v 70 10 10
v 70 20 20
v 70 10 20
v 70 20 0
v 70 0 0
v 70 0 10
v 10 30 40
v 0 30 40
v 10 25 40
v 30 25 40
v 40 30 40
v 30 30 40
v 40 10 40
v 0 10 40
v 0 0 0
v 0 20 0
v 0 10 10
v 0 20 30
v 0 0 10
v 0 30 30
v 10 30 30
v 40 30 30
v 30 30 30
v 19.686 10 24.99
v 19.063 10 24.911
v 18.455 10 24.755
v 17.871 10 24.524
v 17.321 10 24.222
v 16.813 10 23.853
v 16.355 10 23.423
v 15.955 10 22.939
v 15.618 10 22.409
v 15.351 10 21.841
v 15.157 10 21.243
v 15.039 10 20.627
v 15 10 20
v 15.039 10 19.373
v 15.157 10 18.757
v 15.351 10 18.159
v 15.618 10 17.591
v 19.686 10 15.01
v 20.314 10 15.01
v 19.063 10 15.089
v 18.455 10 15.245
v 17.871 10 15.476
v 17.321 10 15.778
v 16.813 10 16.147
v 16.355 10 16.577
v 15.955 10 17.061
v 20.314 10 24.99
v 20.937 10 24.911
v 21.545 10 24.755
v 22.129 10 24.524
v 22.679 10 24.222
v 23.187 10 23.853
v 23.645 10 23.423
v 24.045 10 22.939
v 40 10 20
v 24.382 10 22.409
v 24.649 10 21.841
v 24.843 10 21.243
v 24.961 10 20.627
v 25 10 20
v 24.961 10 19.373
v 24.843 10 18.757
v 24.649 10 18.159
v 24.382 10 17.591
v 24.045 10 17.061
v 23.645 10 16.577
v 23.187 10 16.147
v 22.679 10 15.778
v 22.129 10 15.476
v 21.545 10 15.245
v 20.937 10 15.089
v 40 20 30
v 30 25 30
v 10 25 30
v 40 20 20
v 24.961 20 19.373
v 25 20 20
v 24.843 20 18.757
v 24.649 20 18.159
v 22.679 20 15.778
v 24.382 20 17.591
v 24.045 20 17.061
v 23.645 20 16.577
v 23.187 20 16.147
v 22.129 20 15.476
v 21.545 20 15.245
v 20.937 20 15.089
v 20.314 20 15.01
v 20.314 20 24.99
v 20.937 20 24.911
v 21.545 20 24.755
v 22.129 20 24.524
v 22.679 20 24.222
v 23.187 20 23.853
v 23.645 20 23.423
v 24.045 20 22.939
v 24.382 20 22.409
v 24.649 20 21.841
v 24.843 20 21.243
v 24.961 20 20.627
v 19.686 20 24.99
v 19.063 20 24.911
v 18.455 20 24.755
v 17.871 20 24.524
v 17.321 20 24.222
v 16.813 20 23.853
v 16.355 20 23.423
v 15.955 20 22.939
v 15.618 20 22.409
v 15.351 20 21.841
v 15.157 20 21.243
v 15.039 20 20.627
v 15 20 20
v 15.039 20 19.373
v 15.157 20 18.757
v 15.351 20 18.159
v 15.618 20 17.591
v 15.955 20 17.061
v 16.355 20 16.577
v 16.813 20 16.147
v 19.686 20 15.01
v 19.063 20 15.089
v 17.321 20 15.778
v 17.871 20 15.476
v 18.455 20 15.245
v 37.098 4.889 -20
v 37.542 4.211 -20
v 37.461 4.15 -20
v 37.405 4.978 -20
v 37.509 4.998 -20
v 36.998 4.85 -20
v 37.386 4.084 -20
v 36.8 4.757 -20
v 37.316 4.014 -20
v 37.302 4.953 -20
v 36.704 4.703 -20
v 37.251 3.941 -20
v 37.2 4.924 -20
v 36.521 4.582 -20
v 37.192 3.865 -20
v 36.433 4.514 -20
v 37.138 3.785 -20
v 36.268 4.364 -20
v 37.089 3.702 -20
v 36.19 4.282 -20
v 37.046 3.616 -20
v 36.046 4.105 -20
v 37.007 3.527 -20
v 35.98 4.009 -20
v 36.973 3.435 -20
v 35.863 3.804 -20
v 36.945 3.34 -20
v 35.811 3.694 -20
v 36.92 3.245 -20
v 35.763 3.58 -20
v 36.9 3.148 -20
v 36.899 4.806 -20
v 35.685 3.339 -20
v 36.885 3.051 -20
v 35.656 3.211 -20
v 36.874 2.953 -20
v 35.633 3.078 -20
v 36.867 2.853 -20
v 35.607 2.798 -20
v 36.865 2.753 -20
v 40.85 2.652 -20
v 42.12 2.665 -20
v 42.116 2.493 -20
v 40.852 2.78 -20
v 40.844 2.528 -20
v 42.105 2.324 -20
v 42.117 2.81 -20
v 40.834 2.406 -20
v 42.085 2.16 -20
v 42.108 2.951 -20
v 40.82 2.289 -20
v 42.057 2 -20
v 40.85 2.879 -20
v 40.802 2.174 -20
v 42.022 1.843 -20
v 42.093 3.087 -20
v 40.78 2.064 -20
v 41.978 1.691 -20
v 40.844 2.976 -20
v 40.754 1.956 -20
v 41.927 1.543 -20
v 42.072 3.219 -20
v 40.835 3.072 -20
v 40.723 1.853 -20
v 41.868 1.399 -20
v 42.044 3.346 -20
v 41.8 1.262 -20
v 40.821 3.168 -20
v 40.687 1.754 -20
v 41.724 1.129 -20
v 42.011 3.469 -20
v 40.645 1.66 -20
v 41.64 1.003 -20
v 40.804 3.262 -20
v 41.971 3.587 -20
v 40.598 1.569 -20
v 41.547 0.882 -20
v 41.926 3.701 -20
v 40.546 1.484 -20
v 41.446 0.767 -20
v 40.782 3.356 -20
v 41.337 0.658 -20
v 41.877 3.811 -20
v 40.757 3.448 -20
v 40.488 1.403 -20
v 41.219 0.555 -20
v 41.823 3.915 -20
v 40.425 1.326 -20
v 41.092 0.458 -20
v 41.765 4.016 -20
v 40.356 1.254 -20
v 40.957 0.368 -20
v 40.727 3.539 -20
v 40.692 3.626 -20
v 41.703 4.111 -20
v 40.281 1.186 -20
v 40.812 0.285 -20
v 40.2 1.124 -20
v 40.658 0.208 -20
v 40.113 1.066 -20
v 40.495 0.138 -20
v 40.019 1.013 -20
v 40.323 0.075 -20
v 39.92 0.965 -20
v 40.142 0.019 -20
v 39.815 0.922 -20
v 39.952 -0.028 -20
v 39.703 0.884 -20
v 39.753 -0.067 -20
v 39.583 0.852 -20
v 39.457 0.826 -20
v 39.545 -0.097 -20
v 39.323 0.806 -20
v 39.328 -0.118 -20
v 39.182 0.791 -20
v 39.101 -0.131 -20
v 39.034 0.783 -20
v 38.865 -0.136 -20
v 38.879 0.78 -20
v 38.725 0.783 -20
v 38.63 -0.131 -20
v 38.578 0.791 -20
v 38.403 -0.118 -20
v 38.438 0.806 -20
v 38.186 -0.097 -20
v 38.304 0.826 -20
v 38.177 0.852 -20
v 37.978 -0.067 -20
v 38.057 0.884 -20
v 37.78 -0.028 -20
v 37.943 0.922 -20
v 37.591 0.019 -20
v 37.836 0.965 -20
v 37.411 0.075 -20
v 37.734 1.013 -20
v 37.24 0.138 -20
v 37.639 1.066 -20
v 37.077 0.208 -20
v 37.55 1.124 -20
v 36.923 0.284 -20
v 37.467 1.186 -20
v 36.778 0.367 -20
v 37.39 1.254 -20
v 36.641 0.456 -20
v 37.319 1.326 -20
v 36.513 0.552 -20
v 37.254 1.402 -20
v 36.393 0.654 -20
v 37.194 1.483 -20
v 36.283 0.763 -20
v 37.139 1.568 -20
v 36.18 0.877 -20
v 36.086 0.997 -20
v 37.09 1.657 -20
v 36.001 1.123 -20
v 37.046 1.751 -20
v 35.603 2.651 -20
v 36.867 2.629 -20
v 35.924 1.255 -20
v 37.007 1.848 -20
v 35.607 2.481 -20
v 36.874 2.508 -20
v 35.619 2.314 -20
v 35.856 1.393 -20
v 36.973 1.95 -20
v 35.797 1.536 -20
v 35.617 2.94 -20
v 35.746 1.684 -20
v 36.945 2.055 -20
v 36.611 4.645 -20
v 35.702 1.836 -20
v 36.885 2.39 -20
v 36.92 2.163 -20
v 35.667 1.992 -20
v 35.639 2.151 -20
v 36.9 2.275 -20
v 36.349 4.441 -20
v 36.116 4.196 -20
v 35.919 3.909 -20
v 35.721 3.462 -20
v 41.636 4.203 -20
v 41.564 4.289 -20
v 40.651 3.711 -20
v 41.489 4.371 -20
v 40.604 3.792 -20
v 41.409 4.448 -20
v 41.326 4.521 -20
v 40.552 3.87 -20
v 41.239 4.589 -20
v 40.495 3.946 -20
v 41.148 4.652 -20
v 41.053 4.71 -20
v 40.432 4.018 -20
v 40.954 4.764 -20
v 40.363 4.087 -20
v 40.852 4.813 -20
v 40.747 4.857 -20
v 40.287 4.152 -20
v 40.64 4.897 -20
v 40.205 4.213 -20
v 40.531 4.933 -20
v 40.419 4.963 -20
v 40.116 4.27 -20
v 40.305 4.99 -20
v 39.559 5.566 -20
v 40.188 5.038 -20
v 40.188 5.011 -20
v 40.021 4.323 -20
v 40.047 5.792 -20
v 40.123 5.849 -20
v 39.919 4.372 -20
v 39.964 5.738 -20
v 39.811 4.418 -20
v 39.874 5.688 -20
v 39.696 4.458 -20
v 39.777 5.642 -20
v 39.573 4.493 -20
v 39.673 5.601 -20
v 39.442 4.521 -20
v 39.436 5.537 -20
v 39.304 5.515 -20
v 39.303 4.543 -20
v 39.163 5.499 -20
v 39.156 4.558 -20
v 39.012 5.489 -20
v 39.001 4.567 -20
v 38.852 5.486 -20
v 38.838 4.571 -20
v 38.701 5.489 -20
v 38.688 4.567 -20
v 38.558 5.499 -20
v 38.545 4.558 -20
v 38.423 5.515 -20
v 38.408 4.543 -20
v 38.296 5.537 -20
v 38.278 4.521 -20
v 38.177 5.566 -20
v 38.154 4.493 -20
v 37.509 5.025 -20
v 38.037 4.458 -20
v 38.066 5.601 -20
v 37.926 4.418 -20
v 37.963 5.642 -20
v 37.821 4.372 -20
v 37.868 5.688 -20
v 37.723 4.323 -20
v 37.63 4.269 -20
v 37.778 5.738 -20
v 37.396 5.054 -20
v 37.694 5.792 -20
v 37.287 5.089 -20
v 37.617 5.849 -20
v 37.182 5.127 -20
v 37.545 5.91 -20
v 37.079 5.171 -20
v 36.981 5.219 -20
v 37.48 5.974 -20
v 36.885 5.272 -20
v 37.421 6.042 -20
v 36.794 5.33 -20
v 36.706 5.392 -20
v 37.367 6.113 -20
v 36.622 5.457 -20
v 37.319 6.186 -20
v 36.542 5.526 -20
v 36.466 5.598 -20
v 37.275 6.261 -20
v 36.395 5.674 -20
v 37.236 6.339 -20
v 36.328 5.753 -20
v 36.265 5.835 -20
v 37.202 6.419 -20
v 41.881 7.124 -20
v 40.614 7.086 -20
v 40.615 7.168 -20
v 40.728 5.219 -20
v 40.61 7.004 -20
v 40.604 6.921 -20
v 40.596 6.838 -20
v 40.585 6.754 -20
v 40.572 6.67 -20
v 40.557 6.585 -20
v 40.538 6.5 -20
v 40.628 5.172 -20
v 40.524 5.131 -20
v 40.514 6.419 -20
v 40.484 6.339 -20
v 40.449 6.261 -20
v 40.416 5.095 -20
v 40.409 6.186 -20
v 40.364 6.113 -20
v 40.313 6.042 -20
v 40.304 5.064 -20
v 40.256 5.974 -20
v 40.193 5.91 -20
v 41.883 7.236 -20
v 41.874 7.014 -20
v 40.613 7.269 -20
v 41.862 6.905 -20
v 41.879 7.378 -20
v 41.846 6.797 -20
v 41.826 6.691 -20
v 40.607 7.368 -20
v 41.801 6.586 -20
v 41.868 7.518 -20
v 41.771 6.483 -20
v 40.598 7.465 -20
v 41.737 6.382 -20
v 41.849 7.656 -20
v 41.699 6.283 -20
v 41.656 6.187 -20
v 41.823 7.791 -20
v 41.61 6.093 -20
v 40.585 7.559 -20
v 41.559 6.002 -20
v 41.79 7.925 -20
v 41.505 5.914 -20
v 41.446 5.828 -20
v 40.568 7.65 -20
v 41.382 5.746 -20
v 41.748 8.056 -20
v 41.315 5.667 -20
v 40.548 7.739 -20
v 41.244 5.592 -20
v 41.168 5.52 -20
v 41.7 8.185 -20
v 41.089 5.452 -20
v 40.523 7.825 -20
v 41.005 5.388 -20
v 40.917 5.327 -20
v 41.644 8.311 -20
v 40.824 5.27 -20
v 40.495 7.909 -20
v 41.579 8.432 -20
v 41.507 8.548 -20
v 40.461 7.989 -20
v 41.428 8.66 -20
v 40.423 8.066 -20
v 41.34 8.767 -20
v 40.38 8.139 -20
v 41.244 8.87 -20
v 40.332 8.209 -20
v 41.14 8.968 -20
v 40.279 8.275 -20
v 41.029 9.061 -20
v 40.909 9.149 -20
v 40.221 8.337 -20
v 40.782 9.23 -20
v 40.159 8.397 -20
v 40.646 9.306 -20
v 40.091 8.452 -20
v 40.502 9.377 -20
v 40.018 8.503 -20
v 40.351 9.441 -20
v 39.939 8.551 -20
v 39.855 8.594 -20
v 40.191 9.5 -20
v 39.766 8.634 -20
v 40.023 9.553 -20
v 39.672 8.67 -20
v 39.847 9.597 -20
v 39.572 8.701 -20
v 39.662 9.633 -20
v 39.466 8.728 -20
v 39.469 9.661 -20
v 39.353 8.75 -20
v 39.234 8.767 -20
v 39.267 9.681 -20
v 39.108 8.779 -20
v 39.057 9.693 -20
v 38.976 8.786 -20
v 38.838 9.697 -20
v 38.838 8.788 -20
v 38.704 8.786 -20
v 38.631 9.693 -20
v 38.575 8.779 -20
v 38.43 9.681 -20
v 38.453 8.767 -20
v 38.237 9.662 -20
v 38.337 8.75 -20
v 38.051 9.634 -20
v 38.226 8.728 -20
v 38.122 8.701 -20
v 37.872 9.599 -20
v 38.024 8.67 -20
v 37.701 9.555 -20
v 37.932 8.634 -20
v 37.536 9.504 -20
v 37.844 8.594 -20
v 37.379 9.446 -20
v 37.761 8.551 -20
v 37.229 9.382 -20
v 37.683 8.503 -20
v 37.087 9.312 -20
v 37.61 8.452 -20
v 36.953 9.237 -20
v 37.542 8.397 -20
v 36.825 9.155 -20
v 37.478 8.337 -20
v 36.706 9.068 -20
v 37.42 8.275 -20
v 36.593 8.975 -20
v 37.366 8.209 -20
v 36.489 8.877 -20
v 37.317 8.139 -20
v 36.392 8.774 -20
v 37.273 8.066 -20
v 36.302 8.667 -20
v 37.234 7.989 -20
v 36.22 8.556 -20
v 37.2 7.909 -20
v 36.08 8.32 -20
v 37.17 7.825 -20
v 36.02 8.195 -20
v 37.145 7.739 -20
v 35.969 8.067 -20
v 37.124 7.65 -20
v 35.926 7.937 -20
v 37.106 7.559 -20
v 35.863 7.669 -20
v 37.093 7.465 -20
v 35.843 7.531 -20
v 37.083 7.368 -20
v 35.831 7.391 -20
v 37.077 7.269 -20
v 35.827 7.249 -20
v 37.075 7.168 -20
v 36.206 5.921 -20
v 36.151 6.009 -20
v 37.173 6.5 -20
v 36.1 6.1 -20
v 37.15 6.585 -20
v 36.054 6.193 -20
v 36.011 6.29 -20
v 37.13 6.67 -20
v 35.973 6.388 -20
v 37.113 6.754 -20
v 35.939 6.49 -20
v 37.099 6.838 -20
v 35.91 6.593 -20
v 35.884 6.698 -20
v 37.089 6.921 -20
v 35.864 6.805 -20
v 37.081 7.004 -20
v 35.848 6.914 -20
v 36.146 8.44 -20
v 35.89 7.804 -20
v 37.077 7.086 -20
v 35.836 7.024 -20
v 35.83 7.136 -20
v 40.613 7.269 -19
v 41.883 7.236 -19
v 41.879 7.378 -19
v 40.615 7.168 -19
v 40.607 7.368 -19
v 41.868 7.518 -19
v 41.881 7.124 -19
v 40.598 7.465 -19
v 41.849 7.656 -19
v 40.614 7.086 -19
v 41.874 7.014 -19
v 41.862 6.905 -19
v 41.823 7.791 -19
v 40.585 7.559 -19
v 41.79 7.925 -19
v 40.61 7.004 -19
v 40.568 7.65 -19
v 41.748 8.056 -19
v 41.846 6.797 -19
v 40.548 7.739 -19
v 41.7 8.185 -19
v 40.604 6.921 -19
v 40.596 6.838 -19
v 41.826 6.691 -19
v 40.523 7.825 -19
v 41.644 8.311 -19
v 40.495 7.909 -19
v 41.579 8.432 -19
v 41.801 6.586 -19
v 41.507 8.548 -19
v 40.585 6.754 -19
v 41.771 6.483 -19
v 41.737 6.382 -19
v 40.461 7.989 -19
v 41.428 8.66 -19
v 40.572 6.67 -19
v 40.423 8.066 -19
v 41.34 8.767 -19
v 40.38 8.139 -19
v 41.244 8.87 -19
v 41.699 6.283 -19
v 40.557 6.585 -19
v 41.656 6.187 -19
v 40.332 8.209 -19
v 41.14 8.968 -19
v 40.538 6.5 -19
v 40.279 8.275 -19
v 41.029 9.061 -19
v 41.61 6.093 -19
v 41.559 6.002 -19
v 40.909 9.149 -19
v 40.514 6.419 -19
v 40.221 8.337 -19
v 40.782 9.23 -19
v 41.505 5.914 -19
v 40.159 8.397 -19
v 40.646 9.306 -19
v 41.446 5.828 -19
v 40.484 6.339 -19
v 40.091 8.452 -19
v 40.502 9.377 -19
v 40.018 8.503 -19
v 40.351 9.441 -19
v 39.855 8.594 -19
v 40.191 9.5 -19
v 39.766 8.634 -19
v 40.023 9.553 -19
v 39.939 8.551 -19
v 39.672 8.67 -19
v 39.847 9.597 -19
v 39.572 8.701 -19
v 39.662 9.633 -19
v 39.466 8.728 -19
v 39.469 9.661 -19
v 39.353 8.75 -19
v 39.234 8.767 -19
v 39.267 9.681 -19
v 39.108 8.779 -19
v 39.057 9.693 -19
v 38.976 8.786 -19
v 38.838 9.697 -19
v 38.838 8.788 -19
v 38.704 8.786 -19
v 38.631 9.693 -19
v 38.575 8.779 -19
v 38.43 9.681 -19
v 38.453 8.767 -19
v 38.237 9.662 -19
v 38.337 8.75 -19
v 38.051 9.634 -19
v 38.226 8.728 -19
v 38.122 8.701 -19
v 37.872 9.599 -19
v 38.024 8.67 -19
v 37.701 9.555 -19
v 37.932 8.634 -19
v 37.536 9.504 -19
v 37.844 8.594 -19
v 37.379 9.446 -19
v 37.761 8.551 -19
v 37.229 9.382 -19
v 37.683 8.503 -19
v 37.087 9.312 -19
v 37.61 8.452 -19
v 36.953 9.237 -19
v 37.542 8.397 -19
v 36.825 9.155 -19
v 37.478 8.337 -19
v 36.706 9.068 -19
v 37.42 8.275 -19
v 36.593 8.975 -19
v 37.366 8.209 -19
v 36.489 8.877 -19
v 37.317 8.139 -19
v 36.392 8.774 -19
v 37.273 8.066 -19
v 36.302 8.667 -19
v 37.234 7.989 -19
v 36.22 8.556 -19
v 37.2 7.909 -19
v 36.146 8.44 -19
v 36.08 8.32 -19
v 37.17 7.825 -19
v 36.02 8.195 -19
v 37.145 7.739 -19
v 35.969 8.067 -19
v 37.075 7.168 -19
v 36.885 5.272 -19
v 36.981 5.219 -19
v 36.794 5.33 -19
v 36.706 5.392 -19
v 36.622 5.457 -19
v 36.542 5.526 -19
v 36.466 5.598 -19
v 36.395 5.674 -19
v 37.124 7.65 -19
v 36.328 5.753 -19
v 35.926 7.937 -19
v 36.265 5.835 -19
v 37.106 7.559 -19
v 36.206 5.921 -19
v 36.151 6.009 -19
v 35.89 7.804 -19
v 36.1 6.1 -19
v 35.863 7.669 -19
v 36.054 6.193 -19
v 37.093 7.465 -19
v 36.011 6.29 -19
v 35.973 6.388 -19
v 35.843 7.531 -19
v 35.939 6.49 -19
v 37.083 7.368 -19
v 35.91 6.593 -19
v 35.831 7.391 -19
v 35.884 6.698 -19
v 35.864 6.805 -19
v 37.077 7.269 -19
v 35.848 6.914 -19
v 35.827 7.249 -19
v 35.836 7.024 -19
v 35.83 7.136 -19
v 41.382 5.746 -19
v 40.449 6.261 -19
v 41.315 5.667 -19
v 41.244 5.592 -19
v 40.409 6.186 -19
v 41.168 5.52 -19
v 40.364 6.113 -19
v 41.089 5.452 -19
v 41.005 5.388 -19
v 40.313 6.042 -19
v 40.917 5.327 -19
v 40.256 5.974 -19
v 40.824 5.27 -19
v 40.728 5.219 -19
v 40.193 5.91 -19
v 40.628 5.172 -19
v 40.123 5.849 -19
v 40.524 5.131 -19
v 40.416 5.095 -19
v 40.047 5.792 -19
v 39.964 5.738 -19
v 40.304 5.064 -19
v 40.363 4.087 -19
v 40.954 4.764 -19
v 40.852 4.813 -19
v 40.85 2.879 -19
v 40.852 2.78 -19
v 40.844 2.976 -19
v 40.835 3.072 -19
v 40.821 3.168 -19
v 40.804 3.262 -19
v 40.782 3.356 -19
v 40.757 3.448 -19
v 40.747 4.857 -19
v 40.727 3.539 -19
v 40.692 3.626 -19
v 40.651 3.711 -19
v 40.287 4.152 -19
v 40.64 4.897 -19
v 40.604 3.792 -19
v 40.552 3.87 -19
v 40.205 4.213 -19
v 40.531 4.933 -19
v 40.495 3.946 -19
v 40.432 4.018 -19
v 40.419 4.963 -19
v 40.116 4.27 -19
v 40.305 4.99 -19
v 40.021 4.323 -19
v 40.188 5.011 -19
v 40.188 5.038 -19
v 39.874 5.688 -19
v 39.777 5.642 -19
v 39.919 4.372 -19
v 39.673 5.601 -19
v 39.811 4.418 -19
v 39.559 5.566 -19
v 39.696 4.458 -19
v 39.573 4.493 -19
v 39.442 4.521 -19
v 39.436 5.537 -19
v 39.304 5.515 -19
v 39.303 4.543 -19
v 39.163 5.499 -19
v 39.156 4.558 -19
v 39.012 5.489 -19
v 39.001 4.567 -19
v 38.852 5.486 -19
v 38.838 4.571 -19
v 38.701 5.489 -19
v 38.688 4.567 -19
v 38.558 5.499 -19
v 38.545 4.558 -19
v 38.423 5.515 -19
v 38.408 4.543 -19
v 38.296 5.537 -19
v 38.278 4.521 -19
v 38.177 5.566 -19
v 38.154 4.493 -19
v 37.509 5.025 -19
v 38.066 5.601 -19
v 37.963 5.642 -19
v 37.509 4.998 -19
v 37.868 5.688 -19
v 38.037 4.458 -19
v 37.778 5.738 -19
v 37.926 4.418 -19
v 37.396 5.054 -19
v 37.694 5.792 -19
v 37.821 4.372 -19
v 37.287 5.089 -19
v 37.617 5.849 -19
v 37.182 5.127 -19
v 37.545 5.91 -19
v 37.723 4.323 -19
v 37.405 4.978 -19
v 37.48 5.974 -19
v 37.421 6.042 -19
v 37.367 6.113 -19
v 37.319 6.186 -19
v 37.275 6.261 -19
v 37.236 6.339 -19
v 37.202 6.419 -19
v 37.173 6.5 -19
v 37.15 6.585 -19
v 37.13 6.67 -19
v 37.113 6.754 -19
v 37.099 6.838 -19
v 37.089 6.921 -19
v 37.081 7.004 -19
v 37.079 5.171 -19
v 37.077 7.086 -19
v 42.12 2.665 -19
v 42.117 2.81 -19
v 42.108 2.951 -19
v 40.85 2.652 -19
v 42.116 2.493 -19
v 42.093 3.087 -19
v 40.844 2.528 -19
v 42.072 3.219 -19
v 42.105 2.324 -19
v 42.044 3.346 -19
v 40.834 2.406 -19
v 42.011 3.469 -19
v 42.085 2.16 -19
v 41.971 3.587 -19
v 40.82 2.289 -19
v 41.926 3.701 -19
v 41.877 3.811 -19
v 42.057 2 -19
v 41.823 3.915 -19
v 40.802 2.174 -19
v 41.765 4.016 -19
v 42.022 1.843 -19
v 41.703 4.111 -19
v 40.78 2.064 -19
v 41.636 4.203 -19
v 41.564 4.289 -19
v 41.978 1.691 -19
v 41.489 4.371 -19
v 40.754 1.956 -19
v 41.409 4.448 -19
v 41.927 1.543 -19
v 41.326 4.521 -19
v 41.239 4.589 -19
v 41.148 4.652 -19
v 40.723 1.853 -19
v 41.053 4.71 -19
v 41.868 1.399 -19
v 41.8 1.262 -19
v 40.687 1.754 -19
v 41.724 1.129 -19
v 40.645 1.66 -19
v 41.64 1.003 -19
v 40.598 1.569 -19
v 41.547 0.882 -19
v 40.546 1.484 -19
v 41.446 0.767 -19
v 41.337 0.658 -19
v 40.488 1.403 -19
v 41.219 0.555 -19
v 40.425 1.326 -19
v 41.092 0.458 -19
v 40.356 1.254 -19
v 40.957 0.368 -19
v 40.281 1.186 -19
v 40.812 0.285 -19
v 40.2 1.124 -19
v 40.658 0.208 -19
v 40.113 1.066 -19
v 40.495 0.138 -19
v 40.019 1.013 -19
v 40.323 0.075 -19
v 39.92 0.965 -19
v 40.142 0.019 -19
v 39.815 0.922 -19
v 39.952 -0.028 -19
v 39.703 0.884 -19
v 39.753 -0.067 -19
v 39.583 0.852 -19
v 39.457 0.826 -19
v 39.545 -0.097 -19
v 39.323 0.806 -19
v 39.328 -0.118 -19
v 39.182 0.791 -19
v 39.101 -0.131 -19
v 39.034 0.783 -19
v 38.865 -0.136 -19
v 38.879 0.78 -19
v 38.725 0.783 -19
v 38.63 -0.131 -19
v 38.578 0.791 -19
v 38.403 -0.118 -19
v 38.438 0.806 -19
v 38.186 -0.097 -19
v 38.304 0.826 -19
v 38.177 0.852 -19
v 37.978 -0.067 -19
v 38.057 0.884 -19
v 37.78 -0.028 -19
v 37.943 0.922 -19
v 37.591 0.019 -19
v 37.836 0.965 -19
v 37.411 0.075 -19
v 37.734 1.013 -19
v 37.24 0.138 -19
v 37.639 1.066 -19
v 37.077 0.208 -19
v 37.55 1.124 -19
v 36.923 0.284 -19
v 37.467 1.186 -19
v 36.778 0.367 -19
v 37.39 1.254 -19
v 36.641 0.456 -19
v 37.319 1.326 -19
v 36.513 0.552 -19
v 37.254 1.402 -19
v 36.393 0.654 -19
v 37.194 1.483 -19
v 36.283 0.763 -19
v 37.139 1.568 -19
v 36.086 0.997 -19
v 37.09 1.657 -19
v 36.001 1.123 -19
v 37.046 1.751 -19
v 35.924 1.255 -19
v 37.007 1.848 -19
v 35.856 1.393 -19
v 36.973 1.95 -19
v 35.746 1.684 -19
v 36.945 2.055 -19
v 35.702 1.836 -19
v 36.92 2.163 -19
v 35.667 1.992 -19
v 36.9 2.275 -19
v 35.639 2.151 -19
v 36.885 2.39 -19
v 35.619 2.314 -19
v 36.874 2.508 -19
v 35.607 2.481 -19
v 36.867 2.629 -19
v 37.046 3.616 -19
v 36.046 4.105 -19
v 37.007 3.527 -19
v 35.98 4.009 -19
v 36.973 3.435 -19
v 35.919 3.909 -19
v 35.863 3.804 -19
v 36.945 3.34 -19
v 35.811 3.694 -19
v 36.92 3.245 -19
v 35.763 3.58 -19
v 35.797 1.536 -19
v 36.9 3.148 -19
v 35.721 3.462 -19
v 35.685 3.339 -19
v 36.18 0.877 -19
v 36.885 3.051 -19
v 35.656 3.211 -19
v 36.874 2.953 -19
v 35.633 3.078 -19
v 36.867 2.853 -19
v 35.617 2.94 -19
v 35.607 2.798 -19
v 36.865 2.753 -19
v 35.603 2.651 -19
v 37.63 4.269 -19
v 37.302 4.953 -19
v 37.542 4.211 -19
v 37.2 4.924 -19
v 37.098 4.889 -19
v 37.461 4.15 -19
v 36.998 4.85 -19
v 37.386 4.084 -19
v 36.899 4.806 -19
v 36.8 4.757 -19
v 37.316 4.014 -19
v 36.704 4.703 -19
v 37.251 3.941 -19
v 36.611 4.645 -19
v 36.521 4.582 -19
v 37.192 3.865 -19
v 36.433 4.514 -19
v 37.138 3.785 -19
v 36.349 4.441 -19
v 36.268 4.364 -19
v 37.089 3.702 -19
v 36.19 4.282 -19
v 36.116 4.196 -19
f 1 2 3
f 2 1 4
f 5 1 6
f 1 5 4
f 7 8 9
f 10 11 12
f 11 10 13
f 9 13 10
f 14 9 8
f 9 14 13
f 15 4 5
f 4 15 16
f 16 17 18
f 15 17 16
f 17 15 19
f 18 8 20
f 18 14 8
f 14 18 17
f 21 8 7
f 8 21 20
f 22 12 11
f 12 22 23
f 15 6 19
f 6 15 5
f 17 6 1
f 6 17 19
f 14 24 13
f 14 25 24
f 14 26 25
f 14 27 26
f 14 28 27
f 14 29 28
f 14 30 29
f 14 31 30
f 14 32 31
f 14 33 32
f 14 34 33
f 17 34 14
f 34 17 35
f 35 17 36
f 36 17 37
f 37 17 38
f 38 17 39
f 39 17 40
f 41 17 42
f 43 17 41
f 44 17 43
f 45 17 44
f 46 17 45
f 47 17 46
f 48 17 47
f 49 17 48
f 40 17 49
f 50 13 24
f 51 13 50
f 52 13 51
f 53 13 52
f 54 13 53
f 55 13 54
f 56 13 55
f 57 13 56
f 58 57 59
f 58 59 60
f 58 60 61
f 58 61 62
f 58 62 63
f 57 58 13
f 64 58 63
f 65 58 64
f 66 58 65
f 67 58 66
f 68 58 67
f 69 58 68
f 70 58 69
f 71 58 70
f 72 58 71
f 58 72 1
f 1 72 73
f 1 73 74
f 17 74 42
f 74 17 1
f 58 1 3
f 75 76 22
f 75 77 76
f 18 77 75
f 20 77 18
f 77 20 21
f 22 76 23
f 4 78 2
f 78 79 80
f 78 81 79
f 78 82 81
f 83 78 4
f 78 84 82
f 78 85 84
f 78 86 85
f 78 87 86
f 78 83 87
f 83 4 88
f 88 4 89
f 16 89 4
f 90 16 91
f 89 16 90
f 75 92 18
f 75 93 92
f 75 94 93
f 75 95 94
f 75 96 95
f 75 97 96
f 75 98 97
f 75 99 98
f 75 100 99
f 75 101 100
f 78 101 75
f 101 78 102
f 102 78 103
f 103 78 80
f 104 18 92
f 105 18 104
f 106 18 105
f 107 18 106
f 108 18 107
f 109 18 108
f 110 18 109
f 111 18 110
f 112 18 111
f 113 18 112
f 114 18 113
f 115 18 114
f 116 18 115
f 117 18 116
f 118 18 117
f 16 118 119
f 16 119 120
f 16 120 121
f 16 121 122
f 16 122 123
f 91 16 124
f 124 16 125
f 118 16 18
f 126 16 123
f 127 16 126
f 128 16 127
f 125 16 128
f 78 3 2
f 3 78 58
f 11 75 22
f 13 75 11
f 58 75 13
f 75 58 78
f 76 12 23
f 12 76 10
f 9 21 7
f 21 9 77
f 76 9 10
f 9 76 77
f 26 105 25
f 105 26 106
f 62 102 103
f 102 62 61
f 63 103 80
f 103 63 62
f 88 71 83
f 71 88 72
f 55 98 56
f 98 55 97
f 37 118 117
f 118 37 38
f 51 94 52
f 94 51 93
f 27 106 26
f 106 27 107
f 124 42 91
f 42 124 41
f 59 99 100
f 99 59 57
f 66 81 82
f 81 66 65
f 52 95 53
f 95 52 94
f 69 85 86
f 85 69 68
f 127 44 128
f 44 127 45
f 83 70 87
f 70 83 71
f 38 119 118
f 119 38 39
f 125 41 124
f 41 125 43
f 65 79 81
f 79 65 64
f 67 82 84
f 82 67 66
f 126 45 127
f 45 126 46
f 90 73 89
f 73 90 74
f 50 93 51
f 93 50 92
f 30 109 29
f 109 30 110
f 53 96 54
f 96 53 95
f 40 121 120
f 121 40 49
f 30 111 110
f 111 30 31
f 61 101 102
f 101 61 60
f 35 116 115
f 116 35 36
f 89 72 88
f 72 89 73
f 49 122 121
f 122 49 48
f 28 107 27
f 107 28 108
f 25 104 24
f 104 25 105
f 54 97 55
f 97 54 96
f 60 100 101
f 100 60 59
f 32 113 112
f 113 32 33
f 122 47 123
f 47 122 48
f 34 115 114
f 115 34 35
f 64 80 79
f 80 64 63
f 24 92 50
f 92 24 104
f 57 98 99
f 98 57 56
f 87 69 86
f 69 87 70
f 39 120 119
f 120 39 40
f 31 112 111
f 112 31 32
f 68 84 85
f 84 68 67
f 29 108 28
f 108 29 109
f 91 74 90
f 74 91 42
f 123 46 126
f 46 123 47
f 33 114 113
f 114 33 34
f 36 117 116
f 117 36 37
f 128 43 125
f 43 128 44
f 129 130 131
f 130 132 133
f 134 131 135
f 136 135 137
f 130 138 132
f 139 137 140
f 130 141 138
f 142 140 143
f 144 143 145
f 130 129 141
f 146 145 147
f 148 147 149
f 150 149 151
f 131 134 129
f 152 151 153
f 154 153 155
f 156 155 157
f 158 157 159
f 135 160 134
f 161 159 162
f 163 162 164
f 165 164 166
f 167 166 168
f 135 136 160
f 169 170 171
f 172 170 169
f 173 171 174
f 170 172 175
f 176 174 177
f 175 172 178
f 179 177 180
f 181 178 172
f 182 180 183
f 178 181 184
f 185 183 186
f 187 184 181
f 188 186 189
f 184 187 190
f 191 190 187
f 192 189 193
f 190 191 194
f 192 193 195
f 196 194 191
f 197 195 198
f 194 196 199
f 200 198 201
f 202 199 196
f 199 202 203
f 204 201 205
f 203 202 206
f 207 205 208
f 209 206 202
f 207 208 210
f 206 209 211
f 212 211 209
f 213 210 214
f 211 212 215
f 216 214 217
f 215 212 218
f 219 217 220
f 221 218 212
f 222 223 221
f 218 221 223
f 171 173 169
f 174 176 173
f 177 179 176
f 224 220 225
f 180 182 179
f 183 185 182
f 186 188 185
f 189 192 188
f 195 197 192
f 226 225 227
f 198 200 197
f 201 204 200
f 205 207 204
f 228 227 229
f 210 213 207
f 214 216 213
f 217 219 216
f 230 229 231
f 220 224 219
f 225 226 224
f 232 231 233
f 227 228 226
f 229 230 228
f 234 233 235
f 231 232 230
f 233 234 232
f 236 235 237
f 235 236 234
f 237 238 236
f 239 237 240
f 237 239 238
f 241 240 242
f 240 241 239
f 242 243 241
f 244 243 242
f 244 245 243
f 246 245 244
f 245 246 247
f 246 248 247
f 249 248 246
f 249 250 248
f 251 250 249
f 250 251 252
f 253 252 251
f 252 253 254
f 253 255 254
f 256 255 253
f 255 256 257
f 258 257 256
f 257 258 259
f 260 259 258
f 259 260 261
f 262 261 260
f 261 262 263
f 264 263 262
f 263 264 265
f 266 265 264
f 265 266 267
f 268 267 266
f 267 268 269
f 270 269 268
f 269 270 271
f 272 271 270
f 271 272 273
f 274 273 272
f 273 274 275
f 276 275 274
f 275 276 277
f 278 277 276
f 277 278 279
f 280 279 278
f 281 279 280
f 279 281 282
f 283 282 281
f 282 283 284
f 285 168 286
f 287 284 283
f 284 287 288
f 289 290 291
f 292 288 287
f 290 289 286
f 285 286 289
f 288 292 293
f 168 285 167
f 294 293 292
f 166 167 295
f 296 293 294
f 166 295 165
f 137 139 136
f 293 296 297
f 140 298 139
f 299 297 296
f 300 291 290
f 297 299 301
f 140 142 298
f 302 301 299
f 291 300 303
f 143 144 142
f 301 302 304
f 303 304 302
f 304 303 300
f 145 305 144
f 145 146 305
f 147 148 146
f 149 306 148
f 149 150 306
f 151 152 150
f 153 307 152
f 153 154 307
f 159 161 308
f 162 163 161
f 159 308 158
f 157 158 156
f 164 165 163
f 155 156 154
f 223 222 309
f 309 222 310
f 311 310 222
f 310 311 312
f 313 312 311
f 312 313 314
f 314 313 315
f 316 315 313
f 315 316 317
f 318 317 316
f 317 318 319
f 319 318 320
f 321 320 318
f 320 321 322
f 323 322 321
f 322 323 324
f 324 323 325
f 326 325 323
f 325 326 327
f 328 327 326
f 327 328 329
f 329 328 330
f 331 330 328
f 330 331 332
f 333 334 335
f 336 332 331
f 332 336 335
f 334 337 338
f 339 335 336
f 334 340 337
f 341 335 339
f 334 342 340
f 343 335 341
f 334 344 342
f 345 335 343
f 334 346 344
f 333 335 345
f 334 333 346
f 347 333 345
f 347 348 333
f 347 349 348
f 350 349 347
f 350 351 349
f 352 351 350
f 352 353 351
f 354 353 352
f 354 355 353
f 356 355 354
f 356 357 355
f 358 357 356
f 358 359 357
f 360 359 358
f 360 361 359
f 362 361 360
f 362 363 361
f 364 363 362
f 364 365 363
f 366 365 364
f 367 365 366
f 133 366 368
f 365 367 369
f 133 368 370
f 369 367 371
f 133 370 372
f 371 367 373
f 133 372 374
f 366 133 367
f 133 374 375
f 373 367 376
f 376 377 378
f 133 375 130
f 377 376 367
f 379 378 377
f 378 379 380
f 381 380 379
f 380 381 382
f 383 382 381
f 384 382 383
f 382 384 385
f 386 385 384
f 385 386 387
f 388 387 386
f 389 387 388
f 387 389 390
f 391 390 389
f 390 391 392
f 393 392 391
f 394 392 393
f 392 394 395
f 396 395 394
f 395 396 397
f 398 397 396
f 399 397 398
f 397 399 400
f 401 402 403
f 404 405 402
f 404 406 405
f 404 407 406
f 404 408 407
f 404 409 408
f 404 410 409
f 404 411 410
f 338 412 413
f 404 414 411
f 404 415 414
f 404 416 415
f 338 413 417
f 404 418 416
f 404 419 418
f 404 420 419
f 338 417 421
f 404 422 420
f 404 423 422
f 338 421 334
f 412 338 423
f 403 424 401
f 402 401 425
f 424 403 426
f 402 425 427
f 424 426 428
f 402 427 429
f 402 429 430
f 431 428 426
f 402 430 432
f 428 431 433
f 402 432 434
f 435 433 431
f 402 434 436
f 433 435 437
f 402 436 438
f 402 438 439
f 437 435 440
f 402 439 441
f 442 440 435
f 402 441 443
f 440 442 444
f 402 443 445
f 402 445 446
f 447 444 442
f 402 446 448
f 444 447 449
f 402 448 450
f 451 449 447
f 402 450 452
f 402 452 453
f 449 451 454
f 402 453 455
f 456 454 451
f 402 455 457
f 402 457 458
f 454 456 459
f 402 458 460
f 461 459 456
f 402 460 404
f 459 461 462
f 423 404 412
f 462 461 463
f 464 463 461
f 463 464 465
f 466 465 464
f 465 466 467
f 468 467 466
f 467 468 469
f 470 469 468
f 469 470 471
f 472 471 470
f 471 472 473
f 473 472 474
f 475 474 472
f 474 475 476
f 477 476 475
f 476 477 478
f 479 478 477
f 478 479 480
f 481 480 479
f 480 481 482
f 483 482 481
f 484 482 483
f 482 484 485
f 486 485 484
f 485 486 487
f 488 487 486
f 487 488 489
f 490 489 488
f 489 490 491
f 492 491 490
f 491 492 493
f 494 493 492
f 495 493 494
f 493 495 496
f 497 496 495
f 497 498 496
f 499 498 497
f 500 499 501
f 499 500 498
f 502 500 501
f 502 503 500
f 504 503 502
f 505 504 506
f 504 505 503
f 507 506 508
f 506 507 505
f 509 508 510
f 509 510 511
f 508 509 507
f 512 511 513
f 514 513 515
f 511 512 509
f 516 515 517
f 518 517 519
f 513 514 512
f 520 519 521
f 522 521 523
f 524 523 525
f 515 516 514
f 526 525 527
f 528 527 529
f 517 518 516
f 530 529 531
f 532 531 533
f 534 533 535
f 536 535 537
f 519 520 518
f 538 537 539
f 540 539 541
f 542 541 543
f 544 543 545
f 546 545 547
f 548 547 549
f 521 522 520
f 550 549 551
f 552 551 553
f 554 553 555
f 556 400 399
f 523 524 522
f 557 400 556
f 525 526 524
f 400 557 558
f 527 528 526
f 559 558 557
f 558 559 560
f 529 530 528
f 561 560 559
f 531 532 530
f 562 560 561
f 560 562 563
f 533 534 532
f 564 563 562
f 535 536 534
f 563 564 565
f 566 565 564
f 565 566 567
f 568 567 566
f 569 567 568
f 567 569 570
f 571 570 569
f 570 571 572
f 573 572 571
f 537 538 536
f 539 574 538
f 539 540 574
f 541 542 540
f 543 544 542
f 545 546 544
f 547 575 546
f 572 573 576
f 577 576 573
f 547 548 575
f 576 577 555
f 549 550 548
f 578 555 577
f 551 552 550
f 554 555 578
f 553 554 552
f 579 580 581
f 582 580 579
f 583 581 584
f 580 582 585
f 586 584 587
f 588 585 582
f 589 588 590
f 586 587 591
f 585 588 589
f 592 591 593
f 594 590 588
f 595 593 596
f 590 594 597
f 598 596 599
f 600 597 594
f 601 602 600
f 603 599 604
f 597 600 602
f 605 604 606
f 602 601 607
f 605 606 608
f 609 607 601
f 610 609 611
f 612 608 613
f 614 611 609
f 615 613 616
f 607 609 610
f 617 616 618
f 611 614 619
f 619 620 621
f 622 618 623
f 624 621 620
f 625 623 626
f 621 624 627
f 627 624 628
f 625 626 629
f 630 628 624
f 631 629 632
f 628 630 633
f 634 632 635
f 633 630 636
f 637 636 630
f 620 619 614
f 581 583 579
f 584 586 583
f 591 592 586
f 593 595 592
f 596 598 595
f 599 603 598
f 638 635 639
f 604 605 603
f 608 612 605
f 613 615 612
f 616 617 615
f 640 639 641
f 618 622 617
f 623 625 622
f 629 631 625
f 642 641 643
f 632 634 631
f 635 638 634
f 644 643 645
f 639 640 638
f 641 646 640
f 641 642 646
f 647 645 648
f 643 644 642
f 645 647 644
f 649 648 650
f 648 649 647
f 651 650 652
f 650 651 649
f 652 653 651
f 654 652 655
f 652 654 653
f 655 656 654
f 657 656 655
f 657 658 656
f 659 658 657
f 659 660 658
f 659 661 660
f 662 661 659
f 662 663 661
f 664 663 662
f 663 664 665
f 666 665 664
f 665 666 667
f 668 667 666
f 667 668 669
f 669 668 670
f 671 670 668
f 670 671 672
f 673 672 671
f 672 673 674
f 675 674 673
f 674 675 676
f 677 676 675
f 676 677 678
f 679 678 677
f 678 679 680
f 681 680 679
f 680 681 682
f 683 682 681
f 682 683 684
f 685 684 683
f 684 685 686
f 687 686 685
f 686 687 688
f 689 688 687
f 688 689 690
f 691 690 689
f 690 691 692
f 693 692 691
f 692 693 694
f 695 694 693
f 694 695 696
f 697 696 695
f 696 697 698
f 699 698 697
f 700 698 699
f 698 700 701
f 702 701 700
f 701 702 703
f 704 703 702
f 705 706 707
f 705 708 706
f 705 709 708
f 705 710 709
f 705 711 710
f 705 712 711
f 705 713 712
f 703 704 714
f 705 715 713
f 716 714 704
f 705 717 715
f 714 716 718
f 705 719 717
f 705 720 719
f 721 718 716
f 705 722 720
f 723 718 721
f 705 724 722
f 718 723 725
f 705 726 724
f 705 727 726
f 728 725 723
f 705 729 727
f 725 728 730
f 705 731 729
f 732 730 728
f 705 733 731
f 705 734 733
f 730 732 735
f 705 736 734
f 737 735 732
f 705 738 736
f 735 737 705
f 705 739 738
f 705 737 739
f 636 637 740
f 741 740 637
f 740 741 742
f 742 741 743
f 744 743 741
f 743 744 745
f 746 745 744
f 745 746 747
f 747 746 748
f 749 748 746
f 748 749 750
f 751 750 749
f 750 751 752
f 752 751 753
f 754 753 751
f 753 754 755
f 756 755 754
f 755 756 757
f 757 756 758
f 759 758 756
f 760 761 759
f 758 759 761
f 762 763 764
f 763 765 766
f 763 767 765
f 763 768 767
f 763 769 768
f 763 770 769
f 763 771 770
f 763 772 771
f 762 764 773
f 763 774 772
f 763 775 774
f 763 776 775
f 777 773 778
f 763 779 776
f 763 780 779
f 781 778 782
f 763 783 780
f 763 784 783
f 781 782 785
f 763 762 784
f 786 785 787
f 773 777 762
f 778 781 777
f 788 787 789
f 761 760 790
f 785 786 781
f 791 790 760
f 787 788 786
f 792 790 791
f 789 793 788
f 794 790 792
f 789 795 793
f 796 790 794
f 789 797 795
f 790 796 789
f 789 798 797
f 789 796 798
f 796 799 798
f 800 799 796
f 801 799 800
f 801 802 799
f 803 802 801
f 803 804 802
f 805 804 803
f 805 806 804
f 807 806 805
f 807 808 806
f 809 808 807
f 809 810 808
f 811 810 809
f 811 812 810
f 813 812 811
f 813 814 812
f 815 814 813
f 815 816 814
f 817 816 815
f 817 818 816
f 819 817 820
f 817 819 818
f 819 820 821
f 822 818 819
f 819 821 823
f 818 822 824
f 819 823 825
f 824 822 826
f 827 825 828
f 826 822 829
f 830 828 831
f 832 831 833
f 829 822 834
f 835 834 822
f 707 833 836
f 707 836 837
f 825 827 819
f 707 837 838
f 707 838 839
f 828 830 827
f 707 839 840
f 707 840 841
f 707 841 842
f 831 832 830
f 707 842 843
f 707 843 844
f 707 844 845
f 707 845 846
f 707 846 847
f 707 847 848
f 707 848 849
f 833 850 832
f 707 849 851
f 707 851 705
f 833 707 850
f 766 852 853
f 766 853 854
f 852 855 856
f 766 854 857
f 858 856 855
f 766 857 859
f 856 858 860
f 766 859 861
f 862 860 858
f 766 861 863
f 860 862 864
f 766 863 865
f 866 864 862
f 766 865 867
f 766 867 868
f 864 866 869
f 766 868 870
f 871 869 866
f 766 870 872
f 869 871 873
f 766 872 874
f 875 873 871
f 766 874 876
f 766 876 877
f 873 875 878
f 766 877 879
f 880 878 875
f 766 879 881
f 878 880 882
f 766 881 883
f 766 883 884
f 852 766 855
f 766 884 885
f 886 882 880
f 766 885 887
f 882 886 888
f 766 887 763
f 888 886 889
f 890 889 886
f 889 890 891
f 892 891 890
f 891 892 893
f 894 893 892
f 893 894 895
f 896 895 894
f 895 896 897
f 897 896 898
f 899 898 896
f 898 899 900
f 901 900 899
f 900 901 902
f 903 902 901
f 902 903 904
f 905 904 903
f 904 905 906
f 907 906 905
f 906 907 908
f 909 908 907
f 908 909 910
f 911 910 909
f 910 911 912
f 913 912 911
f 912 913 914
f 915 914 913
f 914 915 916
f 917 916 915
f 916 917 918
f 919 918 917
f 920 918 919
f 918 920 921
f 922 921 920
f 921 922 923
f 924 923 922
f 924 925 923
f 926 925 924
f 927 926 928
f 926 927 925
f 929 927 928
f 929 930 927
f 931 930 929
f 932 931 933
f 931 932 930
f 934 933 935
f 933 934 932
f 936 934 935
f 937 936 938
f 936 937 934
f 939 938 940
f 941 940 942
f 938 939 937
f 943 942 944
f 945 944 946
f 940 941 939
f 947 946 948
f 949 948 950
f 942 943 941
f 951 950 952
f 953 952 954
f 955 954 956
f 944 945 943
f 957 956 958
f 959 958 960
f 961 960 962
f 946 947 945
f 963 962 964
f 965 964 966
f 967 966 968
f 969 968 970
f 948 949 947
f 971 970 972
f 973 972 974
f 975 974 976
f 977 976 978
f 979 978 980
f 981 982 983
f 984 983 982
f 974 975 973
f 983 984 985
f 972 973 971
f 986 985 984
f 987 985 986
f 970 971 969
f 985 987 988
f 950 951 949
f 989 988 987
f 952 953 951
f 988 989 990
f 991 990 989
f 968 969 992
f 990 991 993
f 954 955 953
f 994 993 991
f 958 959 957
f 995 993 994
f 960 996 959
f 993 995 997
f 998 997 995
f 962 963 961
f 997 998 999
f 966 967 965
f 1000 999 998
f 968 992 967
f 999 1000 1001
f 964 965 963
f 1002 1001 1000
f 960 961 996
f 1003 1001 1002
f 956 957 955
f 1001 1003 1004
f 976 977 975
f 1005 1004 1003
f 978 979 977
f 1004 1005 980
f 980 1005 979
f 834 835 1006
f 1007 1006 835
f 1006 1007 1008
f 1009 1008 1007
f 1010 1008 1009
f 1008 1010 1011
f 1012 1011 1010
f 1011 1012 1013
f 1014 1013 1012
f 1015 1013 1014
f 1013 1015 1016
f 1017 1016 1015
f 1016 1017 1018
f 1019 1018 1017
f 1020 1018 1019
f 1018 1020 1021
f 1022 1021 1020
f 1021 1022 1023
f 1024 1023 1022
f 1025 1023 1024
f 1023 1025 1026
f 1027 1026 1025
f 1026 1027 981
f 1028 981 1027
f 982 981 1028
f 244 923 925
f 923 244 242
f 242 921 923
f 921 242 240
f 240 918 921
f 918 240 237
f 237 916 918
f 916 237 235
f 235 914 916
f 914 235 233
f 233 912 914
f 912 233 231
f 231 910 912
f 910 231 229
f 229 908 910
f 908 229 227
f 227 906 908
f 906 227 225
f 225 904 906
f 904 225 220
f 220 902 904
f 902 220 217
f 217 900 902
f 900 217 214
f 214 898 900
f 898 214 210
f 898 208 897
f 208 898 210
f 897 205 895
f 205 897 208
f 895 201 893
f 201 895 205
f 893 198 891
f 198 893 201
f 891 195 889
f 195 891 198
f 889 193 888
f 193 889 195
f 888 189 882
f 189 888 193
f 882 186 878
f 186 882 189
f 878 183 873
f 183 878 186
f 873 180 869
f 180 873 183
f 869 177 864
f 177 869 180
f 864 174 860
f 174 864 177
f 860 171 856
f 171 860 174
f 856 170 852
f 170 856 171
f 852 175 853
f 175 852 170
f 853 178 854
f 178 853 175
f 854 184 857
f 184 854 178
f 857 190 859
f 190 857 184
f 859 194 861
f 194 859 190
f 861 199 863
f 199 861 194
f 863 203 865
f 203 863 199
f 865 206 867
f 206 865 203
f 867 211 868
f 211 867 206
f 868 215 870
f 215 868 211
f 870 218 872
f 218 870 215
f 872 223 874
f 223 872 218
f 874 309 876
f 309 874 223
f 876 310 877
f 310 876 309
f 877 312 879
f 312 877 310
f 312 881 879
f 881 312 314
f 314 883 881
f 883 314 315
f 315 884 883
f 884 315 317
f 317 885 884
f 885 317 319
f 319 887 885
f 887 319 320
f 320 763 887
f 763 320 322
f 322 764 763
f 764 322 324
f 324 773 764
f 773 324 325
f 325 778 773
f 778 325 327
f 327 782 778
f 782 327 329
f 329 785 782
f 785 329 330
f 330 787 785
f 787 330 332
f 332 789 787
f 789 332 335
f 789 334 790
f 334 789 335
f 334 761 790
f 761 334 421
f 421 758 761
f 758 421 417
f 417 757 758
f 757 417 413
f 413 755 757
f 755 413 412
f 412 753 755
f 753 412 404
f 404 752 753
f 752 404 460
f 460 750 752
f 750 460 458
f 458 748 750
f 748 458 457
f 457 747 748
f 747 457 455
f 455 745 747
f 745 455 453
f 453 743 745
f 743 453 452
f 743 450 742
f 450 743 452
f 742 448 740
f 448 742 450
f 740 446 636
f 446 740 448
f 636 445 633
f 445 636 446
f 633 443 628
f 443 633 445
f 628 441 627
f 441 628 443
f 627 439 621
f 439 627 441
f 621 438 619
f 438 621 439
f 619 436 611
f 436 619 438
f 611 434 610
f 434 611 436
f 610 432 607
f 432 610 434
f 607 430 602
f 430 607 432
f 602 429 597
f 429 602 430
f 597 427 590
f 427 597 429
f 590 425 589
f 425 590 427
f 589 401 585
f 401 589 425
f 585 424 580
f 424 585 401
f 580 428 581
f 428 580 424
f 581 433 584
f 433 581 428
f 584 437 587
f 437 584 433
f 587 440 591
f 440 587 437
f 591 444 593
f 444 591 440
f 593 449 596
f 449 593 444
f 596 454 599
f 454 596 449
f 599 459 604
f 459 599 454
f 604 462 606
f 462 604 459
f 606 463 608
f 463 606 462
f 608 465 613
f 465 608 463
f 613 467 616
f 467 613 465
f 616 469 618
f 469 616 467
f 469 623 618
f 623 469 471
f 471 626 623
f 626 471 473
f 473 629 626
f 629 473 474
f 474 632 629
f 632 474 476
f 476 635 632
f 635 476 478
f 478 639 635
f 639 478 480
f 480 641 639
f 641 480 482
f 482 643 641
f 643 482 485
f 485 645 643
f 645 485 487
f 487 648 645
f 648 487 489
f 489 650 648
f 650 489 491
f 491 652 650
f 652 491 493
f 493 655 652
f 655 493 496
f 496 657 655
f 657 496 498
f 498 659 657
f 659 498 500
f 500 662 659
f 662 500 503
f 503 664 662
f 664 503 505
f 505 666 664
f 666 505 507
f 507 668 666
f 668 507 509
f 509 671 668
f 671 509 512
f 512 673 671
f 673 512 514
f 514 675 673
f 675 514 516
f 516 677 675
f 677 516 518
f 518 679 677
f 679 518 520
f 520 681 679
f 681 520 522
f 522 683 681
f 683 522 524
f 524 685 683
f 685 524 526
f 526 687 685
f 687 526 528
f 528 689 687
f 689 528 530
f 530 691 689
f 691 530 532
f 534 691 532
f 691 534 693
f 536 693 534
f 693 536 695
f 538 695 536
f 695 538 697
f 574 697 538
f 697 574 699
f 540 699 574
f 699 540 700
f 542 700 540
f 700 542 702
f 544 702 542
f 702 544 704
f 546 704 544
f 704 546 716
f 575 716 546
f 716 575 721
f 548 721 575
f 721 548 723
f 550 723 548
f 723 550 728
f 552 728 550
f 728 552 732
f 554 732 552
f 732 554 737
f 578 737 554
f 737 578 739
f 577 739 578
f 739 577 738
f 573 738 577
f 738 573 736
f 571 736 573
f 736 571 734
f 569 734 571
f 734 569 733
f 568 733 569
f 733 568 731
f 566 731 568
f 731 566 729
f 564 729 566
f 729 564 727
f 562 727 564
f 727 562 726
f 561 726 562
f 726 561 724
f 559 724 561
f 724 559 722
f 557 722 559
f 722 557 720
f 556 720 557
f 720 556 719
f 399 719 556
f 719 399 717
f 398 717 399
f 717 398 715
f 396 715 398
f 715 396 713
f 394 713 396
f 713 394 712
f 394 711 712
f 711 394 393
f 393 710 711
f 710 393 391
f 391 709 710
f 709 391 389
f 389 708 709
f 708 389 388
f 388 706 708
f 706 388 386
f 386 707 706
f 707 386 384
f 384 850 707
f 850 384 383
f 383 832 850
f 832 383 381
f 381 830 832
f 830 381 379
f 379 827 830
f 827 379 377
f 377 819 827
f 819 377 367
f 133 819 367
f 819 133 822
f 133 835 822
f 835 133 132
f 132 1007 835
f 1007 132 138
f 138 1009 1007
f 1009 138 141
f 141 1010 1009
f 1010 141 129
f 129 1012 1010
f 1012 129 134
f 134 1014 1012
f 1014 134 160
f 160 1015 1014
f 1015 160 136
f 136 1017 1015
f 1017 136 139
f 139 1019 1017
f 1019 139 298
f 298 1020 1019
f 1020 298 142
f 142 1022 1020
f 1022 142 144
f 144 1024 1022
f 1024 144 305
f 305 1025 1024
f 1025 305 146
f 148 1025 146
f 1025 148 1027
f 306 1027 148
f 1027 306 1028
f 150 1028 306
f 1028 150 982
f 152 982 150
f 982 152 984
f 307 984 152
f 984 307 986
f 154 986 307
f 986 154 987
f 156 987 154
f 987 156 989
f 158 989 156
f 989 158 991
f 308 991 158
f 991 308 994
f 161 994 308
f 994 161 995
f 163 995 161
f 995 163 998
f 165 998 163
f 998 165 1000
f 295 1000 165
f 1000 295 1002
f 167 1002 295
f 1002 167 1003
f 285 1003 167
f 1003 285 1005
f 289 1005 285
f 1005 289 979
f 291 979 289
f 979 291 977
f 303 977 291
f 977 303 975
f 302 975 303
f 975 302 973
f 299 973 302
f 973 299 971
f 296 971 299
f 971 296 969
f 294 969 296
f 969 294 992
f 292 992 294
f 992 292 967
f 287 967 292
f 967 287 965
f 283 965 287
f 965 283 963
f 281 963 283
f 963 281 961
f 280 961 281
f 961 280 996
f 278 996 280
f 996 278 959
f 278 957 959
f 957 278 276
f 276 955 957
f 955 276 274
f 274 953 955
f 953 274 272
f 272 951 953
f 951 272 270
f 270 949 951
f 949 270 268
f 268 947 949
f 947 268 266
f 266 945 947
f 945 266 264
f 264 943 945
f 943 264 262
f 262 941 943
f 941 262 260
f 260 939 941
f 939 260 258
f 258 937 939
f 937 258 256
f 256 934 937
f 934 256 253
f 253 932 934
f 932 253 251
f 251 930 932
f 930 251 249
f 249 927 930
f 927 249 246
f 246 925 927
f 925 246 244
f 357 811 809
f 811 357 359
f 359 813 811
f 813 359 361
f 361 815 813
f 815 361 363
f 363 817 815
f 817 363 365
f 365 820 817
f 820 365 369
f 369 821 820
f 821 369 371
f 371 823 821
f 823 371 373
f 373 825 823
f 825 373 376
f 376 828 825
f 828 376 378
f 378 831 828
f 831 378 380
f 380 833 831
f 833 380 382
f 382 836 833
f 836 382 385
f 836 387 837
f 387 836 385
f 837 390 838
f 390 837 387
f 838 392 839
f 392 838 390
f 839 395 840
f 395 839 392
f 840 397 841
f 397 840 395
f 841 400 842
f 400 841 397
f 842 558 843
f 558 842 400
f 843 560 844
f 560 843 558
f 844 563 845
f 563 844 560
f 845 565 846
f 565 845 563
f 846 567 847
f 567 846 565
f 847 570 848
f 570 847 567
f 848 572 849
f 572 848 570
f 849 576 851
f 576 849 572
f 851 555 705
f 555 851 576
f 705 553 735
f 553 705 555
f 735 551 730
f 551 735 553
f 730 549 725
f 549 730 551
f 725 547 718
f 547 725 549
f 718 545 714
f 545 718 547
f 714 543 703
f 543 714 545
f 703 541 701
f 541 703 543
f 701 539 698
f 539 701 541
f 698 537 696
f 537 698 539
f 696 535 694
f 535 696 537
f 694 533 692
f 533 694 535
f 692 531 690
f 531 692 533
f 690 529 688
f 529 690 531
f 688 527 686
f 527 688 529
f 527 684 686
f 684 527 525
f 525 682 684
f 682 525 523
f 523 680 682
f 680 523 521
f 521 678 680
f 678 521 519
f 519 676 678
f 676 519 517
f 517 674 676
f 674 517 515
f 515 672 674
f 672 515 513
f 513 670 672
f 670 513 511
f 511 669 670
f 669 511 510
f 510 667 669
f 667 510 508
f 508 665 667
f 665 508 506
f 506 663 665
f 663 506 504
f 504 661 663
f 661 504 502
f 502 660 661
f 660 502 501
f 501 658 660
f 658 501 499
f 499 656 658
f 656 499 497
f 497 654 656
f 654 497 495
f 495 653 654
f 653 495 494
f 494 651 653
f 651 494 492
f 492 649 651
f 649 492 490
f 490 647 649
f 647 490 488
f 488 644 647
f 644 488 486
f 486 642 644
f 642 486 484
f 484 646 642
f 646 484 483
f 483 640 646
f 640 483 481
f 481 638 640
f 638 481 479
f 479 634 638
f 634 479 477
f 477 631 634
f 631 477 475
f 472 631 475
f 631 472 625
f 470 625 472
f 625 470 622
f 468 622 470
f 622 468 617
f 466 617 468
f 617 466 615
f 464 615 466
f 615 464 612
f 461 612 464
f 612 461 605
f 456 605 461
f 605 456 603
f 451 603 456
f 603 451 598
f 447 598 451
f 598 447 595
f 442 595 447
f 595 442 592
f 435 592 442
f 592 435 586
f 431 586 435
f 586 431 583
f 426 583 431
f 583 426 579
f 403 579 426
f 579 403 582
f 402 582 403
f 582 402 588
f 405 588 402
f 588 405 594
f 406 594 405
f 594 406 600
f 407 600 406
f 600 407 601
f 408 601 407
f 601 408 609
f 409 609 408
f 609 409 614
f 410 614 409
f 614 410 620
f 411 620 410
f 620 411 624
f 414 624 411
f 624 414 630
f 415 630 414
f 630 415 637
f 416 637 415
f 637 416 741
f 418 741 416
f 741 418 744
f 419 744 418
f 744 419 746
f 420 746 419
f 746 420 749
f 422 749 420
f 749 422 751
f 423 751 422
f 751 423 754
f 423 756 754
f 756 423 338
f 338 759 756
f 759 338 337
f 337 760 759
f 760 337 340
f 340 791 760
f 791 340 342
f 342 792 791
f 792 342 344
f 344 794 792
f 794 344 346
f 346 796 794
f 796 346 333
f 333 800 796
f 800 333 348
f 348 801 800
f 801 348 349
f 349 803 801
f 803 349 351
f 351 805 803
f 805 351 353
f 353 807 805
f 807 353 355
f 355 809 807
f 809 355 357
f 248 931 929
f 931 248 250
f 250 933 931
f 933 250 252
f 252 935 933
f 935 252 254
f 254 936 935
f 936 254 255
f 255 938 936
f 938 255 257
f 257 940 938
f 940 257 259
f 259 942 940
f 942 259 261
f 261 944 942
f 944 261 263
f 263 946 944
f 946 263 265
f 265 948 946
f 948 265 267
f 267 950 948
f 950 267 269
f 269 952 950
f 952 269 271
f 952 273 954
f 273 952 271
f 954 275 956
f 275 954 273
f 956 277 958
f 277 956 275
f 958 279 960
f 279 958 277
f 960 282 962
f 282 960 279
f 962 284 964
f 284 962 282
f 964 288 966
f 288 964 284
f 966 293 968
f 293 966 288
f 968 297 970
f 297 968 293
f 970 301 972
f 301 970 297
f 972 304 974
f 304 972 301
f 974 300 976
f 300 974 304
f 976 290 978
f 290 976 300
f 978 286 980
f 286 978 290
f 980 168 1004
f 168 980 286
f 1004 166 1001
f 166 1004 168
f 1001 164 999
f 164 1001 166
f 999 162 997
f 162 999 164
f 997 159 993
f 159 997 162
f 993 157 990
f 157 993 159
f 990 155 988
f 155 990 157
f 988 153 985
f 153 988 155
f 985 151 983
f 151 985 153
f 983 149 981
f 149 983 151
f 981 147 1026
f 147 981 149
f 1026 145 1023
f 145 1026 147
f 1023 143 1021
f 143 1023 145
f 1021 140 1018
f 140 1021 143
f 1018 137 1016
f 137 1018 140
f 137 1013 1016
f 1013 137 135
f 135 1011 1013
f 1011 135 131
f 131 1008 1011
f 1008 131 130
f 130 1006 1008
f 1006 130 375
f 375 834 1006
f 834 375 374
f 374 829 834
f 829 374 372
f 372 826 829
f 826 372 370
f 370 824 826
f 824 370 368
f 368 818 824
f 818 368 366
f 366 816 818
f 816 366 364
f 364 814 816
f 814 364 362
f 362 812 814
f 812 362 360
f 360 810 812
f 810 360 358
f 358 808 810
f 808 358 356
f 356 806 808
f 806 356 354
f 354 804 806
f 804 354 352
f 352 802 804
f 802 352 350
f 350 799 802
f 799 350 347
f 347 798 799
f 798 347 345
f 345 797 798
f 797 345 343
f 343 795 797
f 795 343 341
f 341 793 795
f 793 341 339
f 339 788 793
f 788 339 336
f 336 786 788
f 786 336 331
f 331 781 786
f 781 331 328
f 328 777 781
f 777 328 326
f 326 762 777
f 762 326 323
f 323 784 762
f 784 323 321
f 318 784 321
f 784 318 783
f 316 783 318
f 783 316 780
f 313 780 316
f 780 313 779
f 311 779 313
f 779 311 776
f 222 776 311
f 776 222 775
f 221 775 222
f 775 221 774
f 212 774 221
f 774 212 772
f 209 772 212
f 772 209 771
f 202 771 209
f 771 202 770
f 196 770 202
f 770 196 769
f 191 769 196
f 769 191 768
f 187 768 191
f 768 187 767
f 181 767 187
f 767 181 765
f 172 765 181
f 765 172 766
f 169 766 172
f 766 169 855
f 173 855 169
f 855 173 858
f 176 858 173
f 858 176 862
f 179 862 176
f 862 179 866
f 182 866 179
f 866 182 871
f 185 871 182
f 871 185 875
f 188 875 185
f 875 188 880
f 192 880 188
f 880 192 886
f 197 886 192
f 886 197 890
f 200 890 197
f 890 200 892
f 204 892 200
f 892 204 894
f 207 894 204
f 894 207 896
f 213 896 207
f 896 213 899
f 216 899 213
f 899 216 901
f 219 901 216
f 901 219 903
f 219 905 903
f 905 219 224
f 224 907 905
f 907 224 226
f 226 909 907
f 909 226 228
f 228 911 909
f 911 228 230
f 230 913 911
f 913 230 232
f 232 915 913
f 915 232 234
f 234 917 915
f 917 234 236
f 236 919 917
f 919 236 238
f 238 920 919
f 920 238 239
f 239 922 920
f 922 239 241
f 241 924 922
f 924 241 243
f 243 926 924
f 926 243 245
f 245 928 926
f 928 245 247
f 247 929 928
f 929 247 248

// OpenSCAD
$fn=50;

cw=70;
cd=30;
ch=40;
cy=10;

difference() {
    cube([cw,cd,ch]);
    translate([0,0,10])
    cube([cw,10,ch-10]);
    translate([0,20,0])
    cube([cw,10,ch-10]);
    translate([40,0,20])
    cube([30,cd,20]);
    translate([10,cd-5,ch-10])
    cube([20,5,10]);
    translate([20,20,20])
    rotate([90,0,0])
    cylinder(h=cy,d=cy);
}
translate([cw/2,0,-20])
linear_extrude(height=1)
text("8");
